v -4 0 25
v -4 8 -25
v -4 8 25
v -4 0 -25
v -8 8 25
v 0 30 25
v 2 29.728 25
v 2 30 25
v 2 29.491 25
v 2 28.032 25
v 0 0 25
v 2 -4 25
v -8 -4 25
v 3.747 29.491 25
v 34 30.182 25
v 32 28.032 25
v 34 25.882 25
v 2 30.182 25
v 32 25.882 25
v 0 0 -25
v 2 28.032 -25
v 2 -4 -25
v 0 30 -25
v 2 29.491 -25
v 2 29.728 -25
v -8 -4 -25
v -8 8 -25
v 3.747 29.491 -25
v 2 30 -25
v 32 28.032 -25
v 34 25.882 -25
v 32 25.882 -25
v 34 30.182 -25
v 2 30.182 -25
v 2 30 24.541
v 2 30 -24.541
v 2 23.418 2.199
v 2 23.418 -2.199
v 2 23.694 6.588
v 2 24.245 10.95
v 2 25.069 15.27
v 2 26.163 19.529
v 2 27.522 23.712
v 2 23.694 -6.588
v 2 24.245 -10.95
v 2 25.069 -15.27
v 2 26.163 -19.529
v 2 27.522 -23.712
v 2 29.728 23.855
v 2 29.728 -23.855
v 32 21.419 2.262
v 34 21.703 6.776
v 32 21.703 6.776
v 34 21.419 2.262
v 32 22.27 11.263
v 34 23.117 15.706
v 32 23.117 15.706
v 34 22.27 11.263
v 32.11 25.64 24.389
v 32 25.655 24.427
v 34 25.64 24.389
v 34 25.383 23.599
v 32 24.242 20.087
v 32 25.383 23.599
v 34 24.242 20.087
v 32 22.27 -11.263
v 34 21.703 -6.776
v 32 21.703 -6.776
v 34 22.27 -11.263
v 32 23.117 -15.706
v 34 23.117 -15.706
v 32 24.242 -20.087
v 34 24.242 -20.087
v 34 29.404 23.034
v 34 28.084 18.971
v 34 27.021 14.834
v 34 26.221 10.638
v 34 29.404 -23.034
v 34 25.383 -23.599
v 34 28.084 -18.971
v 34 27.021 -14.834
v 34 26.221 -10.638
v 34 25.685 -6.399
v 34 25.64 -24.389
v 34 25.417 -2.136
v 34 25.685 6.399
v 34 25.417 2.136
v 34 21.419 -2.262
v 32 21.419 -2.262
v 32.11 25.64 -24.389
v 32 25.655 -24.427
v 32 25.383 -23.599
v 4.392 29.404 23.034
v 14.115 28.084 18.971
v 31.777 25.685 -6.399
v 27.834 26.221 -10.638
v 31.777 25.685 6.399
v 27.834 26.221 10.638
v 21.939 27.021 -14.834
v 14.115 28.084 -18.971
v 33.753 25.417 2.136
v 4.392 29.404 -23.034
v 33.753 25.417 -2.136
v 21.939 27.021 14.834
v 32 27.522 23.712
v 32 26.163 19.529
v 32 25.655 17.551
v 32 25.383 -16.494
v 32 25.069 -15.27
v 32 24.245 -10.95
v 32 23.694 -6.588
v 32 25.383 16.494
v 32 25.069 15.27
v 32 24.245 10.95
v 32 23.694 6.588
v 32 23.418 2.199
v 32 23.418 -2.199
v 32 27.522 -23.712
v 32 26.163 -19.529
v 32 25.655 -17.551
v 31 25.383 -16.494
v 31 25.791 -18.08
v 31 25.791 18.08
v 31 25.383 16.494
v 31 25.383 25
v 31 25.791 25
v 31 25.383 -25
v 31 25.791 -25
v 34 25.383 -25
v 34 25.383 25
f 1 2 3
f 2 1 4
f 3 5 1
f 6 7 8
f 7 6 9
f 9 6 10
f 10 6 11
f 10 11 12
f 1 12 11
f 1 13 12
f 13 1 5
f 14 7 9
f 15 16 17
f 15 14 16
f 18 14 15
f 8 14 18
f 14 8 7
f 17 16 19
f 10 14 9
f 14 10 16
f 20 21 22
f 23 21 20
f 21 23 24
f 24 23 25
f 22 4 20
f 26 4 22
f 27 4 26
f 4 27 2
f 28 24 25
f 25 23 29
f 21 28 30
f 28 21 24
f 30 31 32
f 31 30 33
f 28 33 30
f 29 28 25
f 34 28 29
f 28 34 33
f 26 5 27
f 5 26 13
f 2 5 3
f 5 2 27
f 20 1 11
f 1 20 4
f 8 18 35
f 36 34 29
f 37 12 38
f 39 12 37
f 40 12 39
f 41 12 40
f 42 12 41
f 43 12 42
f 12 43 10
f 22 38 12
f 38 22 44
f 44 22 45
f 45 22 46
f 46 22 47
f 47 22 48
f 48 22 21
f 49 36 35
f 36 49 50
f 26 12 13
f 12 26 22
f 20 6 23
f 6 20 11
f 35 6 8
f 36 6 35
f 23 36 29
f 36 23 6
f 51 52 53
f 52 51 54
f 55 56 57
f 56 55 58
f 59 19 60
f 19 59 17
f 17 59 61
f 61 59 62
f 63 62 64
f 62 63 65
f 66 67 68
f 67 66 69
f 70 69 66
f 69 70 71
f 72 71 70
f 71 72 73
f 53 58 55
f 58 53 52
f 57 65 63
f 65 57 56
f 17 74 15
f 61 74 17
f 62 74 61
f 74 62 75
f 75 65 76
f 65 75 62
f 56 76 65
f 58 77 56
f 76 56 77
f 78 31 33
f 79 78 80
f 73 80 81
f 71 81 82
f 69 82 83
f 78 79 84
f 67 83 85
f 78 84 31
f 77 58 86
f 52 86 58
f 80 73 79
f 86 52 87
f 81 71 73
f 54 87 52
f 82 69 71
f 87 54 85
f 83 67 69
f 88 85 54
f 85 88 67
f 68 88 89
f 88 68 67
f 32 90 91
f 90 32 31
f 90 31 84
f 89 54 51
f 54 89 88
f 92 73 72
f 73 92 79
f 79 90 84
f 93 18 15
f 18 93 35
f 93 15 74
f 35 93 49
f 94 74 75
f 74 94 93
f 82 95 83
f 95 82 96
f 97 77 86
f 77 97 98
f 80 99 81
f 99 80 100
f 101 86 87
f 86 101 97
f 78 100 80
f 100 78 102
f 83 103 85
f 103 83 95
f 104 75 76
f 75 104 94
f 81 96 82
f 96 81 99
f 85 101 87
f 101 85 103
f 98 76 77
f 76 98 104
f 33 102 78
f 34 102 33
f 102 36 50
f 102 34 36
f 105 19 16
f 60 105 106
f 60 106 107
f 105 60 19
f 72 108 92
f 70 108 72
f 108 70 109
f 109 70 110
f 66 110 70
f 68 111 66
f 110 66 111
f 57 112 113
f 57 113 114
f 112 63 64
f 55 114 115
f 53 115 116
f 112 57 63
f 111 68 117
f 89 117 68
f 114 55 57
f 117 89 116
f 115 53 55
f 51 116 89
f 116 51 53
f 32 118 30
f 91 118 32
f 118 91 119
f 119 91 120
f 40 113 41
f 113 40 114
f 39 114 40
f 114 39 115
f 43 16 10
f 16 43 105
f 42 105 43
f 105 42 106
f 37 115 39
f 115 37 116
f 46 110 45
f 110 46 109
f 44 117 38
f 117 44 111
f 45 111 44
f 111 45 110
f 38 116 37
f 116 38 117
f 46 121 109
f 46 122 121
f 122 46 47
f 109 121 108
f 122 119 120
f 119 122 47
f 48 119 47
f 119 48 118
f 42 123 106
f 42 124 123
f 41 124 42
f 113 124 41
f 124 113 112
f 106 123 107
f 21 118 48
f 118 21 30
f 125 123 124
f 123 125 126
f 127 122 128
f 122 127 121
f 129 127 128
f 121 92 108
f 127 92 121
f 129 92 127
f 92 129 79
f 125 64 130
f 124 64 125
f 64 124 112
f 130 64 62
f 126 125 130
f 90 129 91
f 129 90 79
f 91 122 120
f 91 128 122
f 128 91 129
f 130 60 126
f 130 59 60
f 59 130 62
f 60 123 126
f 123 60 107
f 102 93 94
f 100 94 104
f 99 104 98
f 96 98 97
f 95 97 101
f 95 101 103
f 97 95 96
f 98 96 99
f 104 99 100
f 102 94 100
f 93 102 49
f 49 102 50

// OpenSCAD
detail = 100;
largeur = 50;
hauteur = 30;
largeur_encoche = 4;
largeur_bordure = 4;
profondeur_encoche = 8;
largeur_casque = 30;
diametre = 140;
epaisseur = 2;

module crochet(){
    cube([largeur_encoche,profondeur_encoche,largeur]);
    translate([0,-2*epaisseur,0])
    cube([largeur_encoche+largeur_bordure+epaisseur,2*epaisseur,largeur]);
}

module tube(diam_ext, diam_int, longueur){
    difference(){
        cylinder(d=diam_ext, h=longueur, $fn=detail);
        translate([0,0,-0.5])
        cylinder(d=diam_int, h=longueur+1, $fn=detail);
    }
}

module prisme(hauteur_arc){
    linear_extrude(height=largeur, center=true, convexity = 0, twist = 0) 
                polygon(points=[
                    [0,0],
                    [0,largeur_casque+2*epaisseur],
                    [-hauteur_arc,0],
                    ], paths=[[0,1,2]]);
}

module tube_bordure(diametre, epaisseur, longueur){
    difference(){
        tube(diametre+2*epaisseur,diametre-2*epaisseur,longueur+epaisseur);
        translate([0,0,-1])
        tube(diametre+2*epaisseur+1,diametre,longueur+1);
    }
}

module arc(){
    largeur_bloc = diametre/2+epaisseur+1;
    difference(){
        tube_bordure(diametre, epaisseur, largeur_casque);
    
        translate([0,0,-0.5])
        cube([largeur_bloc,largeur_bloc,largeur_casque+epaisseur+1]);
        translate([-largeur_bloc+0.5,0,-0.5])
        cube([largeur_bloc,largeur_bloc,largeur_casque+epaisseur+1]);
        translate([-largeur_bloc+0.5,-largeur_bloc+0.5,-0.5])
        cube([largeur_bloc,largeur_bloc,largeur_casque+epaisseur+1]);
    }
}

module support(){
    rayon = diametre/2;
    hauteur_arc = rayon - rayon*sqrt(1-pow((largeur/2)/rayon,2));

    translate([0,0,-largeur/2])
    union(){
        cube([epaisseur,hauteur,largeur]);
        translate([-(largeur_encoche+largeur_bordure),0,0]) crochet();
    }
    difference(){
    translate([epaisseur,rayon+hauteur-epaisseur-hauteur_arc,0])
    rotate([-45,0,0])
    rotate([0,90,0])
    arc();
        translate([largeur_casque,hauteur,50+largeur/2])
        cube([2*largeur_casque, 2*hauteur, 100], center=true);
        translate([largeur_casque,hauteur,-(50+largeur/2)])
        cube([2*largeur_casque, 2*hauteur, 100], center=true);
    }
    translate([0,hauteur-hauteur_arc,0])
    difference(){
        rotate([0,0,-90])
        prisme(hauteur_arc);
        translate([0,rayon,0])
        rotate([0,90,0])
        tube(2*diametre,diametre+epaisseur/2,largeur_casque+1);
    }
}

support();
